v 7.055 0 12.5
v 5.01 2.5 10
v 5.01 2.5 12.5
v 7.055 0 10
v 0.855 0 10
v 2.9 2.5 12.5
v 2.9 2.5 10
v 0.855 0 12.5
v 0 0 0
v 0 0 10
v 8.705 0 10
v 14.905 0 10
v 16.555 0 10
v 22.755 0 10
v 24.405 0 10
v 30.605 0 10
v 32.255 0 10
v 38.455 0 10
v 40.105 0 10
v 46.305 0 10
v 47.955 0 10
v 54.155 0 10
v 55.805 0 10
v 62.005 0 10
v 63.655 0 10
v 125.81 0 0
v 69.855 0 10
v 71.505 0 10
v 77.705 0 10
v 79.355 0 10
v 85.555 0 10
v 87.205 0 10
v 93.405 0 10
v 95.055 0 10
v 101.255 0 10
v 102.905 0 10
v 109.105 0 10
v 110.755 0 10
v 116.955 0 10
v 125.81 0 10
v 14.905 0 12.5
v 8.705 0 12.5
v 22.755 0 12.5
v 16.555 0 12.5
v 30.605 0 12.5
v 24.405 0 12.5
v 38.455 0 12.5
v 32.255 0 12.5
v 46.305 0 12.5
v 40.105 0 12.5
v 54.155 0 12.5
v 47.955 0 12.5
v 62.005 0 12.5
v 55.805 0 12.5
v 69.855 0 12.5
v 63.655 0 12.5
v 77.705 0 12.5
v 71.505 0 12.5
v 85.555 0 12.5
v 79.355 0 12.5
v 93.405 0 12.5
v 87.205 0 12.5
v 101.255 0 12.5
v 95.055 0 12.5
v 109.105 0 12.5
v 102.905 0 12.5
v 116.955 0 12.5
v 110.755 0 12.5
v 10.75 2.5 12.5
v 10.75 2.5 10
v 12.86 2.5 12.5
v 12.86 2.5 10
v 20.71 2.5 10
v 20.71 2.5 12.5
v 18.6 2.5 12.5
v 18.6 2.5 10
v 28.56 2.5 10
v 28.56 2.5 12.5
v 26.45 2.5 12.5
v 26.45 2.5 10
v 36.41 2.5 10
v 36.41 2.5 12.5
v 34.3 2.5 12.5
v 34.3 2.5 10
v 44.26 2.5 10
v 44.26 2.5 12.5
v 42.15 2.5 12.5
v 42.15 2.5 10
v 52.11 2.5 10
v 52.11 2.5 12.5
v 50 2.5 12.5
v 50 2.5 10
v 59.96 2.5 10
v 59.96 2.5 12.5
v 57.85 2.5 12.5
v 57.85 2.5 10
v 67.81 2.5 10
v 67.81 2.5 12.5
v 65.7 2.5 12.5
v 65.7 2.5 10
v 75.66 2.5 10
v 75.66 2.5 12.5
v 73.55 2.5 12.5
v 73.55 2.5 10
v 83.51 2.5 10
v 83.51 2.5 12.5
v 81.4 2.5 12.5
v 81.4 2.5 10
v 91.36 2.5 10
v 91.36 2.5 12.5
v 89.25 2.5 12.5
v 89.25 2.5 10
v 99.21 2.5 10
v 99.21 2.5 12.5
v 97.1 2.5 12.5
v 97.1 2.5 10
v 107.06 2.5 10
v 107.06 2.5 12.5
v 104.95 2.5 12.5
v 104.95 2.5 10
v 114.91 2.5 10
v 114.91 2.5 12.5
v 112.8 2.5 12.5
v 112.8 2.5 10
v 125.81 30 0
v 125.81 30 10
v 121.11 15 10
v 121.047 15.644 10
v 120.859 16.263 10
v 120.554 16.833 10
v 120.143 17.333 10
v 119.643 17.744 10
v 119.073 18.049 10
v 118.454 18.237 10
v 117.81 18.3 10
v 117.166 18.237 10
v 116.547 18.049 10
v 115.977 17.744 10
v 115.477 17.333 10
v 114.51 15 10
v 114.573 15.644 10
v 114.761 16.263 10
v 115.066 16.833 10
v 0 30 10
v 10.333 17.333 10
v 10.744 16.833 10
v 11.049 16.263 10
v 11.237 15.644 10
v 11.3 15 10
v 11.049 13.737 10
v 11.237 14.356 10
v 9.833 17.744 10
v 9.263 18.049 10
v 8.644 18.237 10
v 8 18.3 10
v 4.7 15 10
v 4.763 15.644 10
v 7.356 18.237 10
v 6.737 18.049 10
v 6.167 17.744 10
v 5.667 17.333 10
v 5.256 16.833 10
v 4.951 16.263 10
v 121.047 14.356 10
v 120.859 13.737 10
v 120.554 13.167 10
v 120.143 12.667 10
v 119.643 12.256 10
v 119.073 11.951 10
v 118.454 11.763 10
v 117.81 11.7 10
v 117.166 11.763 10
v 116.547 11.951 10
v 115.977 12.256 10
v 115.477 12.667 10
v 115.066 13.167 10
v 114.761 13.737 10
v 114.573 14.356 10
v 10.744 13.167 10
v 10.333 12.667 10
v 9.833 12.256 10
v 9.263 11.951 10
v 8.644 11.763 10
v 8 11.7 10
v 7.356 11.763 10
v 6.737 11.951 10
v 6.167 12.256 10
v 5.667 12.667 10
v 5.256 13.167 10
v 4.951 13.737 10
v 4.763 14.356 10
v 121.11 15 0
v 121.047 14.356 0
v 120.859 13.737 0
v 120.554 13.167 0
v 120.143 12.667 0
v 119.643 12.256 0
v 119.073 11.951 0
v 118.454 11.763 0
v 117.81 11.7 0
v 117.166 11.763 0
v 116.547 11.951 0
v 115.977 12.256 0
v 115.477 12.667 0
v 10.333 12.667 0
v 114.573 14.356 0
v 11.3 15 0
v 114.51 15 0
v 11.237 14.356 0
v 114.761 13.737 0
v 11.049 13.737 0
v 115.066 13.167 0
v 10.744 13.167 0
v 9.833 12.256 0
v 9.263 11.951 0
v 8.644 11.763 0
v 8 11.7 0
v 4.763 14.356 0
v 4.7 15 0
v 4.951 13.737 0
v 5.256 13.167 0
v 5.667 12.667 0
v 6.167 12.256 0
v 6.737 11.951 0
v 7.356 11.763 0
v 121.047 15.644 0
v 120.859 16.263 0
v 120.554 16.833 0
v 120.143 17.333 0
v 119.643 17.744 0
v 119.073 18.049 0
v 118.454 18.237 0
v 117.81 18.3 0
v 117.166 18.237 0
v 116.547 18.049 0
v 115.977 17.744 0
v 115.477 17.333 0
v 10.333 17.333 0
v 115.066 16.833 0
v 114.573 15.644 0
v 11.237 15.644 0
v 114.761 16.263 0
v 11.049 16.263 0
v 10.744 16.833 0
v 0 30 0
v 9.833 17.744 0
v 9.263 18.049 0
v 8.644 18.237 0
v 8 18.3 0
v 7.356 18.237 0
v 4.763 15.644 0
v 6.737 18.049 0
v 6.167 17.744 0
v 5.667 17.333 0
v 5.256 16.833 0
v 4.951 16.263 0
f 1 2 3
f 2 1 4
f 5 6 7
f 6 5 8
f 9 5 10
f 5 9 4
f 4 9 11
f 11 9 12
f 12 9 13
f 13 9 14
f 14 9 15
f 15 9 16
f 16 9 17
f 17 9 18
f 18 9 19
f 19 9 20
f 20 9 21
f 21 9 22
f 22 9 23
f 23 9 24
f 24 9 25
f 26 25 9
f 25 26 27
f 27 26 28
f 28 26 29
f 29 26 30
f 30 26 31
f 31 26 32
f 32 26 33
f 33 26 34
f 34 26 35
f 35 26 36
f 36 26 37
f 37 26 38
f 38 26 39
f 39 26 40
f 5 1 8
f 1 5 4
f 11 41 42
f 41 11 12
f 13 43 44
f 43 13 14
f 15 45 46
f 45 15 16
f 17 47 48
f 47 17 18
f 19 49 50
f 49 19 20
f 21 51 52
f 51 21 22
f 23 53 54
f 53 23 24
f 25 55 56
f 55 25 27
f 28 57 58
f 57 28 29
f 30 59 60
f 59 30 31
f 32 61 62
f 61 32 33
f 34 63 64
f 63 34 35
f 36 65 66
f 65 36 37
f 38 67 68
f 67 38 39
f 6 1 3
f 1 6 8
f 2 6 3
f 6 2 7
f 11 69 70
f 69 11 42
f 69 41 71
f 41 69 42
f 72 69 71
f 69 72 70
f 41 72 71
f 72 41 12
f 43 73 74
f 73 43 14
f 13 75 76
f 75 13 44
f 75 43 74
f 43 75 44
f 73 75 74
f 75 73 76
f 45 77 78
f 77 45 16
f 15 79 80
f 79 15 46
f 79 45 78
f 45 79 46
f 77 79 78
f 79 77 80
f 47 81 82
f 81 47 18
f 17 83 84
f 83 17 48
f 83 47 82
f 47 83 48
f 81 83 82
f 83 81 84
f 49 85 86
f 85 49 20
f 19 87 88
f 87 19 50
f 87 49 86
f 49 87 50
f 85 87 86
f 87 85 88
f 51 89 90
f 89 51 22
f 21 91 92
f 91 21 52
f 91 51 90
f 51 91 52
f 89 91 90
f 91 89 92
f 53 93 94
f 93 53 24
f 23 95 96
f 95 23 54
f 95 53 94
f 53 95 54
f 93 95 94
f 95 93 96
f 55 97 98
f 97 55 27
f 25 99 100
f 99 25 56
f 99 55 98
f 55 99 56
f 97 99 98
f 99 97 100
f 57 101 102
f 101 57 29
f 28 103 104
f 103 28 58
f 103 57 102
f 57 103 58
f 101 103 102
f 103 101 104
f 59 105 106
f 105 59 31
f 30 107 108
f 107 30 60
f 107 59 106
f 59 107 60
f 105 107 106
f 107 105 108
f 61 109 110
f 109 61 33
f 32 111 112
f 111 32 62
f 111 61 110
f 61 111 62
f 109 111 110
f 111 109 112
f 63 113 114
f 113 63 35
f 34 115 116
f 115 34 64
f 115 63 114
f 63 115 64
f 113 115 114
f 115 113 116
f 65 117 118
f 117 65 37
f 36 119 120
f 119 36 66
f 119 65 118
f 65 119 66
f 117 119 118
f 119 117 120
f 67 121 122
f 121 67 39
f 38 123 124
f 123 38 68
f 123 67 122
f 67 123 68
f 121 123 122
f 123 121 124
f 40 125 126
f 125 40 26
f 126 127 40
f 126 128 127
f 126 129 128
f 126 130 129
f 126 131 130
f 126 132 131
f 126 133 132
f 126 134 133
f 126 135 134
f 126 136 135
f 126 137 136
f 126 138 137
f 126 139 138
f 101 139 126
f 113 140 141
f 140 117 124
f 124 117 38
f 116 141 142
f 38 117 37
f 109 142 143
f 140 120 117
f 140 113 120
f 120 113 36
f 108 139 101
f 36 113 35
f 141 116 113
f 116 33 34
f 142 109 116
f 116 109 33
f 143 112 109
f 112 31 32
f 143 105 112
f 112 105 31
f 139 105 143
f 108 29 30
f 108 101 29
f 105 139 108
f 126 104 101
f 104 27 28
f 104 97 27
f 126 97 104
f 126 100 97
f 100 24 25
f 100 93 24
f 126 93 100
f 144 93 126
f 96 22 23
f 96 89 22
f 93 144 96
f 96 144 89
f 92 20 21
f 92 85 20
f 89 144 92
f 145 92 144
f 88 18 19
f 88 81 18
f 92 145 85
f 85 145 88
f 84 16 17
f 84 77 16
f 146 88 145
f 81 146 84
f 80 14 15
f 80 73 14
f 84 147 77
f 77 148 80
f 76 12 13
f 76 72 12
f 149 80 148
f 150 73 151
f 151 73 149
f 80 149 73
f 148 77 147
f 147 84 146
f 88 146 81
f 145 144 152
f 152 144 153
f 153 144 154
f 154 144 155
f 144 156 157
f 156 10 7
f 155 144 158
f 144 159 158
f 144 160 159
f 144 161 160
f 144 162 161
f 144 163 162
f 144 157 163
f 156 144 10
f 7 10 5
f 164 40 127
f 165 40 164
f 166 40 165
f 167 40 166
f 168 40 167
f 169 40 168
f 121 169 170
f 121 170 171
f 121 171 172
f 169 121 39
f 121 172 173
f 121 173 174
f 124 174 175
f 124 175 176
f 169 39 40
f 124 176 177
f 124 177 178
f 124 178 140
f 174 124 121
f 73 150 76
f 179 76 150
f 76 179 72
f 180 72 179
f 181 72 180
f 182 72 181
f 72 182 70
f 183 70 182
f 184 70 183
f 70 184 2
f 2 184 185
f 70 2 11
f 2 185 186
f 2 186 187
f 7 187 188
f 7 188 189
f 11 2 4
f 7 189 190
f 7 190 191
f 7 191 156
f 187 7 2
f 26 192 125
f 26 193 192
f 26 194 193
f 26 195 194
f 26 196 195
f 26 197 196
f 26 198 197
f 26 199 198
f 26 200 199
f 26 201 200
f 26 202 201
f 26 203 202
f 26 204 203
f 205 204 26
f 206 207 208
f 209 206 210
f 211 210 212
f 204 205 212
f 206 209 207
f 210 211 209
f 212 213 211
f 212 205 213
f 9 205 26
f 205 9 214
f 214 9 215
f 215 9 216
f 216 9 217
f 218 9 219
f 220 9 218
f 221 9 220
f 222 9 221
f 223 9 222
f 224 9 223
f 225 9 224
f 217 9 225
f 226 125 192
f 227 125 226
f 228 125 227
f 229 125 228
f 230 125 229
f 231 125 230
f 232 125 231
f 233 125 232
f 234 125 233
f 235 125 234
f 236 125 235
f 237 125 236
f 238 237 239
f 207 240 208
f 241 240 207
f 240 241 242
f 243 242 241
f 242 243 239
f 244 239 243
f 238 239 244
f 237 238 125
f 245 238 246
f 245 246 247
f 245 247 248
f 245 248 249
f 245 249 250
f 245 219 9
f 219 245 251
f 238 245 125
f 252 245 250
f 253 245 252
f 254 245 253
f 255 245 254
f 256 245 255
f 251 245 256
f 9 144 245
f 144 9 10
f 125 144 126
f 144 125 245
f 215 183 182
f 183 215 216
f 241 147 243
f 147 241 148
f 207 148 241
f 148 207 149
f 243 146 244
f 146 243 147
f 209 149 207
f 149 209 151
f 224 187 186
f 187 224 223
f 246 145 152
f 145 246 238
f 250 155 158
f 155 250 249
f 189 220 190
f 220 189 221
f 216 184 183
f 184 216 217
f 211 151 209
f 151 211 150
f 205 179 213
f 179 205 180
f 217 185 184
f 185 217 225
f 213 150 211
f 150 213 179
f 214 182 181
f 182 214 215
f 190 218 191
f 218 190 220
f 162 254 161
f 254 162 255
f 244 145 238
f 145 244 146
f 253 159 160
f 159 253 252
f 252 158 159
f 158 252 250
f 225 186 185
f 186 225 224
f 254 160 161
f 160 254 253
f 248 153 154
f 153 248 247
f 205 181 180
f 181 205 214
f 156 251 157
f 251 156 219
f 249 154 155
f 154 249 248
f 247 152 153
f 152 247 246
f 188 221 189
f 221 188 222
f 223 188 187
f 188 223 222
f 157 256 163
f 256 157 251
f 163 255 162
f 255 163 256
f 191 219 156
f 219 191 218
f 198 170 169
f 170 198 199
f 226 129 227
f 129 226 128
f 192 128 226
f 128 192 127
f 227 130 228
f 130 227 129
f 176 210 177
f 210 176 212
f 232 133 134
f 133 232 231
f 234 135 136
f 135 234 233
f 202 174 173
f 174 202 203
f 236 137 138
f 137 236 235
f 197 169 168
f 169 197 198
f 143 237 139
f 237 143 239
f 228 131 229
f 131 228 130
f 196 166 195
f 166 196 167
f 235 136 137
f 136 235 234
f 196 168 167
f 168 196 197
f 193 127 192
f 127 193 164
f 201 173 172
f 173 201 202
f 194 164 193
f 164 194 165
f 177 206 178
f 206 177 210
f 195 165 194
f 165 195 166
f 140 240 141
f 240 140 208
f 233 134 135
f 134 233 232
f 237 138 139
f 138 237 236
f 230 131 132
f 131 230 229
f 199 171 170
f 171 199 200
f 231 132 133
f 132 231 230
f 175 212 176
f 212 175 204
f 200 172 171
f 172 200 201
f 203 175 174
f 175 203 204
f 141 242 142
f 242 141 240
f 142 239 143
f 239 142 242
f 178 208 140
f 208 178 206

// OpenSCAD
$fn = 32;

// ----------------------------------------------------------------------
// Gear rack: m=2.5 z=15, 125.81 x 30 x 12.5 mm
// ----------------------------------------------------------------------

// --- parameters (mm) ---
rack_len = 125.81;        // rack length, X
rack_w = 30;              // rack width, Y
rack_h = 12.5;            // overall height, Z
modul = 2.5;              // module
body_t = 10;              // tooth root line height
pitch = 7.85;             // circular pitch
tip_w = 2.11;             // tooth thickness at the tip
root_w = 6.2;             // tooth thickness at the root line
hole_d = 6.6;             // mounting hole
sink = 0.6;               // tooth root overlap into the body

tooth_span = 117.81;

module tooth(x0) {
  /* 20 deg flank profile, sunk into the body for a positive overlap */
  translate([x0, 0, body_t - sink])
    linear_extrude(height = rack_h - body_t + sink)
      polygon(points = [[-root_w / 2, 0], [root_w / 2, 0],
                        [tip_w / 2, rack_h - body_t],
                        [-tip_w / 2, rack_h - body_t]]);
}

difference() {
  union() {
    cube([rack_len, rack_w, body_t]);
    for (i = [0 : 15 - 1])
      tooth((i + 0.5) * pitch + (tooth_span - 15 * pitch) / 2);
  }
  translate([8, 15, -1]) cylinder(h = body_t + 2, d = hole_d);
  translate([117.81, 15, -1]) cylinder(h = body_t + 2, d = hole_d);
}
